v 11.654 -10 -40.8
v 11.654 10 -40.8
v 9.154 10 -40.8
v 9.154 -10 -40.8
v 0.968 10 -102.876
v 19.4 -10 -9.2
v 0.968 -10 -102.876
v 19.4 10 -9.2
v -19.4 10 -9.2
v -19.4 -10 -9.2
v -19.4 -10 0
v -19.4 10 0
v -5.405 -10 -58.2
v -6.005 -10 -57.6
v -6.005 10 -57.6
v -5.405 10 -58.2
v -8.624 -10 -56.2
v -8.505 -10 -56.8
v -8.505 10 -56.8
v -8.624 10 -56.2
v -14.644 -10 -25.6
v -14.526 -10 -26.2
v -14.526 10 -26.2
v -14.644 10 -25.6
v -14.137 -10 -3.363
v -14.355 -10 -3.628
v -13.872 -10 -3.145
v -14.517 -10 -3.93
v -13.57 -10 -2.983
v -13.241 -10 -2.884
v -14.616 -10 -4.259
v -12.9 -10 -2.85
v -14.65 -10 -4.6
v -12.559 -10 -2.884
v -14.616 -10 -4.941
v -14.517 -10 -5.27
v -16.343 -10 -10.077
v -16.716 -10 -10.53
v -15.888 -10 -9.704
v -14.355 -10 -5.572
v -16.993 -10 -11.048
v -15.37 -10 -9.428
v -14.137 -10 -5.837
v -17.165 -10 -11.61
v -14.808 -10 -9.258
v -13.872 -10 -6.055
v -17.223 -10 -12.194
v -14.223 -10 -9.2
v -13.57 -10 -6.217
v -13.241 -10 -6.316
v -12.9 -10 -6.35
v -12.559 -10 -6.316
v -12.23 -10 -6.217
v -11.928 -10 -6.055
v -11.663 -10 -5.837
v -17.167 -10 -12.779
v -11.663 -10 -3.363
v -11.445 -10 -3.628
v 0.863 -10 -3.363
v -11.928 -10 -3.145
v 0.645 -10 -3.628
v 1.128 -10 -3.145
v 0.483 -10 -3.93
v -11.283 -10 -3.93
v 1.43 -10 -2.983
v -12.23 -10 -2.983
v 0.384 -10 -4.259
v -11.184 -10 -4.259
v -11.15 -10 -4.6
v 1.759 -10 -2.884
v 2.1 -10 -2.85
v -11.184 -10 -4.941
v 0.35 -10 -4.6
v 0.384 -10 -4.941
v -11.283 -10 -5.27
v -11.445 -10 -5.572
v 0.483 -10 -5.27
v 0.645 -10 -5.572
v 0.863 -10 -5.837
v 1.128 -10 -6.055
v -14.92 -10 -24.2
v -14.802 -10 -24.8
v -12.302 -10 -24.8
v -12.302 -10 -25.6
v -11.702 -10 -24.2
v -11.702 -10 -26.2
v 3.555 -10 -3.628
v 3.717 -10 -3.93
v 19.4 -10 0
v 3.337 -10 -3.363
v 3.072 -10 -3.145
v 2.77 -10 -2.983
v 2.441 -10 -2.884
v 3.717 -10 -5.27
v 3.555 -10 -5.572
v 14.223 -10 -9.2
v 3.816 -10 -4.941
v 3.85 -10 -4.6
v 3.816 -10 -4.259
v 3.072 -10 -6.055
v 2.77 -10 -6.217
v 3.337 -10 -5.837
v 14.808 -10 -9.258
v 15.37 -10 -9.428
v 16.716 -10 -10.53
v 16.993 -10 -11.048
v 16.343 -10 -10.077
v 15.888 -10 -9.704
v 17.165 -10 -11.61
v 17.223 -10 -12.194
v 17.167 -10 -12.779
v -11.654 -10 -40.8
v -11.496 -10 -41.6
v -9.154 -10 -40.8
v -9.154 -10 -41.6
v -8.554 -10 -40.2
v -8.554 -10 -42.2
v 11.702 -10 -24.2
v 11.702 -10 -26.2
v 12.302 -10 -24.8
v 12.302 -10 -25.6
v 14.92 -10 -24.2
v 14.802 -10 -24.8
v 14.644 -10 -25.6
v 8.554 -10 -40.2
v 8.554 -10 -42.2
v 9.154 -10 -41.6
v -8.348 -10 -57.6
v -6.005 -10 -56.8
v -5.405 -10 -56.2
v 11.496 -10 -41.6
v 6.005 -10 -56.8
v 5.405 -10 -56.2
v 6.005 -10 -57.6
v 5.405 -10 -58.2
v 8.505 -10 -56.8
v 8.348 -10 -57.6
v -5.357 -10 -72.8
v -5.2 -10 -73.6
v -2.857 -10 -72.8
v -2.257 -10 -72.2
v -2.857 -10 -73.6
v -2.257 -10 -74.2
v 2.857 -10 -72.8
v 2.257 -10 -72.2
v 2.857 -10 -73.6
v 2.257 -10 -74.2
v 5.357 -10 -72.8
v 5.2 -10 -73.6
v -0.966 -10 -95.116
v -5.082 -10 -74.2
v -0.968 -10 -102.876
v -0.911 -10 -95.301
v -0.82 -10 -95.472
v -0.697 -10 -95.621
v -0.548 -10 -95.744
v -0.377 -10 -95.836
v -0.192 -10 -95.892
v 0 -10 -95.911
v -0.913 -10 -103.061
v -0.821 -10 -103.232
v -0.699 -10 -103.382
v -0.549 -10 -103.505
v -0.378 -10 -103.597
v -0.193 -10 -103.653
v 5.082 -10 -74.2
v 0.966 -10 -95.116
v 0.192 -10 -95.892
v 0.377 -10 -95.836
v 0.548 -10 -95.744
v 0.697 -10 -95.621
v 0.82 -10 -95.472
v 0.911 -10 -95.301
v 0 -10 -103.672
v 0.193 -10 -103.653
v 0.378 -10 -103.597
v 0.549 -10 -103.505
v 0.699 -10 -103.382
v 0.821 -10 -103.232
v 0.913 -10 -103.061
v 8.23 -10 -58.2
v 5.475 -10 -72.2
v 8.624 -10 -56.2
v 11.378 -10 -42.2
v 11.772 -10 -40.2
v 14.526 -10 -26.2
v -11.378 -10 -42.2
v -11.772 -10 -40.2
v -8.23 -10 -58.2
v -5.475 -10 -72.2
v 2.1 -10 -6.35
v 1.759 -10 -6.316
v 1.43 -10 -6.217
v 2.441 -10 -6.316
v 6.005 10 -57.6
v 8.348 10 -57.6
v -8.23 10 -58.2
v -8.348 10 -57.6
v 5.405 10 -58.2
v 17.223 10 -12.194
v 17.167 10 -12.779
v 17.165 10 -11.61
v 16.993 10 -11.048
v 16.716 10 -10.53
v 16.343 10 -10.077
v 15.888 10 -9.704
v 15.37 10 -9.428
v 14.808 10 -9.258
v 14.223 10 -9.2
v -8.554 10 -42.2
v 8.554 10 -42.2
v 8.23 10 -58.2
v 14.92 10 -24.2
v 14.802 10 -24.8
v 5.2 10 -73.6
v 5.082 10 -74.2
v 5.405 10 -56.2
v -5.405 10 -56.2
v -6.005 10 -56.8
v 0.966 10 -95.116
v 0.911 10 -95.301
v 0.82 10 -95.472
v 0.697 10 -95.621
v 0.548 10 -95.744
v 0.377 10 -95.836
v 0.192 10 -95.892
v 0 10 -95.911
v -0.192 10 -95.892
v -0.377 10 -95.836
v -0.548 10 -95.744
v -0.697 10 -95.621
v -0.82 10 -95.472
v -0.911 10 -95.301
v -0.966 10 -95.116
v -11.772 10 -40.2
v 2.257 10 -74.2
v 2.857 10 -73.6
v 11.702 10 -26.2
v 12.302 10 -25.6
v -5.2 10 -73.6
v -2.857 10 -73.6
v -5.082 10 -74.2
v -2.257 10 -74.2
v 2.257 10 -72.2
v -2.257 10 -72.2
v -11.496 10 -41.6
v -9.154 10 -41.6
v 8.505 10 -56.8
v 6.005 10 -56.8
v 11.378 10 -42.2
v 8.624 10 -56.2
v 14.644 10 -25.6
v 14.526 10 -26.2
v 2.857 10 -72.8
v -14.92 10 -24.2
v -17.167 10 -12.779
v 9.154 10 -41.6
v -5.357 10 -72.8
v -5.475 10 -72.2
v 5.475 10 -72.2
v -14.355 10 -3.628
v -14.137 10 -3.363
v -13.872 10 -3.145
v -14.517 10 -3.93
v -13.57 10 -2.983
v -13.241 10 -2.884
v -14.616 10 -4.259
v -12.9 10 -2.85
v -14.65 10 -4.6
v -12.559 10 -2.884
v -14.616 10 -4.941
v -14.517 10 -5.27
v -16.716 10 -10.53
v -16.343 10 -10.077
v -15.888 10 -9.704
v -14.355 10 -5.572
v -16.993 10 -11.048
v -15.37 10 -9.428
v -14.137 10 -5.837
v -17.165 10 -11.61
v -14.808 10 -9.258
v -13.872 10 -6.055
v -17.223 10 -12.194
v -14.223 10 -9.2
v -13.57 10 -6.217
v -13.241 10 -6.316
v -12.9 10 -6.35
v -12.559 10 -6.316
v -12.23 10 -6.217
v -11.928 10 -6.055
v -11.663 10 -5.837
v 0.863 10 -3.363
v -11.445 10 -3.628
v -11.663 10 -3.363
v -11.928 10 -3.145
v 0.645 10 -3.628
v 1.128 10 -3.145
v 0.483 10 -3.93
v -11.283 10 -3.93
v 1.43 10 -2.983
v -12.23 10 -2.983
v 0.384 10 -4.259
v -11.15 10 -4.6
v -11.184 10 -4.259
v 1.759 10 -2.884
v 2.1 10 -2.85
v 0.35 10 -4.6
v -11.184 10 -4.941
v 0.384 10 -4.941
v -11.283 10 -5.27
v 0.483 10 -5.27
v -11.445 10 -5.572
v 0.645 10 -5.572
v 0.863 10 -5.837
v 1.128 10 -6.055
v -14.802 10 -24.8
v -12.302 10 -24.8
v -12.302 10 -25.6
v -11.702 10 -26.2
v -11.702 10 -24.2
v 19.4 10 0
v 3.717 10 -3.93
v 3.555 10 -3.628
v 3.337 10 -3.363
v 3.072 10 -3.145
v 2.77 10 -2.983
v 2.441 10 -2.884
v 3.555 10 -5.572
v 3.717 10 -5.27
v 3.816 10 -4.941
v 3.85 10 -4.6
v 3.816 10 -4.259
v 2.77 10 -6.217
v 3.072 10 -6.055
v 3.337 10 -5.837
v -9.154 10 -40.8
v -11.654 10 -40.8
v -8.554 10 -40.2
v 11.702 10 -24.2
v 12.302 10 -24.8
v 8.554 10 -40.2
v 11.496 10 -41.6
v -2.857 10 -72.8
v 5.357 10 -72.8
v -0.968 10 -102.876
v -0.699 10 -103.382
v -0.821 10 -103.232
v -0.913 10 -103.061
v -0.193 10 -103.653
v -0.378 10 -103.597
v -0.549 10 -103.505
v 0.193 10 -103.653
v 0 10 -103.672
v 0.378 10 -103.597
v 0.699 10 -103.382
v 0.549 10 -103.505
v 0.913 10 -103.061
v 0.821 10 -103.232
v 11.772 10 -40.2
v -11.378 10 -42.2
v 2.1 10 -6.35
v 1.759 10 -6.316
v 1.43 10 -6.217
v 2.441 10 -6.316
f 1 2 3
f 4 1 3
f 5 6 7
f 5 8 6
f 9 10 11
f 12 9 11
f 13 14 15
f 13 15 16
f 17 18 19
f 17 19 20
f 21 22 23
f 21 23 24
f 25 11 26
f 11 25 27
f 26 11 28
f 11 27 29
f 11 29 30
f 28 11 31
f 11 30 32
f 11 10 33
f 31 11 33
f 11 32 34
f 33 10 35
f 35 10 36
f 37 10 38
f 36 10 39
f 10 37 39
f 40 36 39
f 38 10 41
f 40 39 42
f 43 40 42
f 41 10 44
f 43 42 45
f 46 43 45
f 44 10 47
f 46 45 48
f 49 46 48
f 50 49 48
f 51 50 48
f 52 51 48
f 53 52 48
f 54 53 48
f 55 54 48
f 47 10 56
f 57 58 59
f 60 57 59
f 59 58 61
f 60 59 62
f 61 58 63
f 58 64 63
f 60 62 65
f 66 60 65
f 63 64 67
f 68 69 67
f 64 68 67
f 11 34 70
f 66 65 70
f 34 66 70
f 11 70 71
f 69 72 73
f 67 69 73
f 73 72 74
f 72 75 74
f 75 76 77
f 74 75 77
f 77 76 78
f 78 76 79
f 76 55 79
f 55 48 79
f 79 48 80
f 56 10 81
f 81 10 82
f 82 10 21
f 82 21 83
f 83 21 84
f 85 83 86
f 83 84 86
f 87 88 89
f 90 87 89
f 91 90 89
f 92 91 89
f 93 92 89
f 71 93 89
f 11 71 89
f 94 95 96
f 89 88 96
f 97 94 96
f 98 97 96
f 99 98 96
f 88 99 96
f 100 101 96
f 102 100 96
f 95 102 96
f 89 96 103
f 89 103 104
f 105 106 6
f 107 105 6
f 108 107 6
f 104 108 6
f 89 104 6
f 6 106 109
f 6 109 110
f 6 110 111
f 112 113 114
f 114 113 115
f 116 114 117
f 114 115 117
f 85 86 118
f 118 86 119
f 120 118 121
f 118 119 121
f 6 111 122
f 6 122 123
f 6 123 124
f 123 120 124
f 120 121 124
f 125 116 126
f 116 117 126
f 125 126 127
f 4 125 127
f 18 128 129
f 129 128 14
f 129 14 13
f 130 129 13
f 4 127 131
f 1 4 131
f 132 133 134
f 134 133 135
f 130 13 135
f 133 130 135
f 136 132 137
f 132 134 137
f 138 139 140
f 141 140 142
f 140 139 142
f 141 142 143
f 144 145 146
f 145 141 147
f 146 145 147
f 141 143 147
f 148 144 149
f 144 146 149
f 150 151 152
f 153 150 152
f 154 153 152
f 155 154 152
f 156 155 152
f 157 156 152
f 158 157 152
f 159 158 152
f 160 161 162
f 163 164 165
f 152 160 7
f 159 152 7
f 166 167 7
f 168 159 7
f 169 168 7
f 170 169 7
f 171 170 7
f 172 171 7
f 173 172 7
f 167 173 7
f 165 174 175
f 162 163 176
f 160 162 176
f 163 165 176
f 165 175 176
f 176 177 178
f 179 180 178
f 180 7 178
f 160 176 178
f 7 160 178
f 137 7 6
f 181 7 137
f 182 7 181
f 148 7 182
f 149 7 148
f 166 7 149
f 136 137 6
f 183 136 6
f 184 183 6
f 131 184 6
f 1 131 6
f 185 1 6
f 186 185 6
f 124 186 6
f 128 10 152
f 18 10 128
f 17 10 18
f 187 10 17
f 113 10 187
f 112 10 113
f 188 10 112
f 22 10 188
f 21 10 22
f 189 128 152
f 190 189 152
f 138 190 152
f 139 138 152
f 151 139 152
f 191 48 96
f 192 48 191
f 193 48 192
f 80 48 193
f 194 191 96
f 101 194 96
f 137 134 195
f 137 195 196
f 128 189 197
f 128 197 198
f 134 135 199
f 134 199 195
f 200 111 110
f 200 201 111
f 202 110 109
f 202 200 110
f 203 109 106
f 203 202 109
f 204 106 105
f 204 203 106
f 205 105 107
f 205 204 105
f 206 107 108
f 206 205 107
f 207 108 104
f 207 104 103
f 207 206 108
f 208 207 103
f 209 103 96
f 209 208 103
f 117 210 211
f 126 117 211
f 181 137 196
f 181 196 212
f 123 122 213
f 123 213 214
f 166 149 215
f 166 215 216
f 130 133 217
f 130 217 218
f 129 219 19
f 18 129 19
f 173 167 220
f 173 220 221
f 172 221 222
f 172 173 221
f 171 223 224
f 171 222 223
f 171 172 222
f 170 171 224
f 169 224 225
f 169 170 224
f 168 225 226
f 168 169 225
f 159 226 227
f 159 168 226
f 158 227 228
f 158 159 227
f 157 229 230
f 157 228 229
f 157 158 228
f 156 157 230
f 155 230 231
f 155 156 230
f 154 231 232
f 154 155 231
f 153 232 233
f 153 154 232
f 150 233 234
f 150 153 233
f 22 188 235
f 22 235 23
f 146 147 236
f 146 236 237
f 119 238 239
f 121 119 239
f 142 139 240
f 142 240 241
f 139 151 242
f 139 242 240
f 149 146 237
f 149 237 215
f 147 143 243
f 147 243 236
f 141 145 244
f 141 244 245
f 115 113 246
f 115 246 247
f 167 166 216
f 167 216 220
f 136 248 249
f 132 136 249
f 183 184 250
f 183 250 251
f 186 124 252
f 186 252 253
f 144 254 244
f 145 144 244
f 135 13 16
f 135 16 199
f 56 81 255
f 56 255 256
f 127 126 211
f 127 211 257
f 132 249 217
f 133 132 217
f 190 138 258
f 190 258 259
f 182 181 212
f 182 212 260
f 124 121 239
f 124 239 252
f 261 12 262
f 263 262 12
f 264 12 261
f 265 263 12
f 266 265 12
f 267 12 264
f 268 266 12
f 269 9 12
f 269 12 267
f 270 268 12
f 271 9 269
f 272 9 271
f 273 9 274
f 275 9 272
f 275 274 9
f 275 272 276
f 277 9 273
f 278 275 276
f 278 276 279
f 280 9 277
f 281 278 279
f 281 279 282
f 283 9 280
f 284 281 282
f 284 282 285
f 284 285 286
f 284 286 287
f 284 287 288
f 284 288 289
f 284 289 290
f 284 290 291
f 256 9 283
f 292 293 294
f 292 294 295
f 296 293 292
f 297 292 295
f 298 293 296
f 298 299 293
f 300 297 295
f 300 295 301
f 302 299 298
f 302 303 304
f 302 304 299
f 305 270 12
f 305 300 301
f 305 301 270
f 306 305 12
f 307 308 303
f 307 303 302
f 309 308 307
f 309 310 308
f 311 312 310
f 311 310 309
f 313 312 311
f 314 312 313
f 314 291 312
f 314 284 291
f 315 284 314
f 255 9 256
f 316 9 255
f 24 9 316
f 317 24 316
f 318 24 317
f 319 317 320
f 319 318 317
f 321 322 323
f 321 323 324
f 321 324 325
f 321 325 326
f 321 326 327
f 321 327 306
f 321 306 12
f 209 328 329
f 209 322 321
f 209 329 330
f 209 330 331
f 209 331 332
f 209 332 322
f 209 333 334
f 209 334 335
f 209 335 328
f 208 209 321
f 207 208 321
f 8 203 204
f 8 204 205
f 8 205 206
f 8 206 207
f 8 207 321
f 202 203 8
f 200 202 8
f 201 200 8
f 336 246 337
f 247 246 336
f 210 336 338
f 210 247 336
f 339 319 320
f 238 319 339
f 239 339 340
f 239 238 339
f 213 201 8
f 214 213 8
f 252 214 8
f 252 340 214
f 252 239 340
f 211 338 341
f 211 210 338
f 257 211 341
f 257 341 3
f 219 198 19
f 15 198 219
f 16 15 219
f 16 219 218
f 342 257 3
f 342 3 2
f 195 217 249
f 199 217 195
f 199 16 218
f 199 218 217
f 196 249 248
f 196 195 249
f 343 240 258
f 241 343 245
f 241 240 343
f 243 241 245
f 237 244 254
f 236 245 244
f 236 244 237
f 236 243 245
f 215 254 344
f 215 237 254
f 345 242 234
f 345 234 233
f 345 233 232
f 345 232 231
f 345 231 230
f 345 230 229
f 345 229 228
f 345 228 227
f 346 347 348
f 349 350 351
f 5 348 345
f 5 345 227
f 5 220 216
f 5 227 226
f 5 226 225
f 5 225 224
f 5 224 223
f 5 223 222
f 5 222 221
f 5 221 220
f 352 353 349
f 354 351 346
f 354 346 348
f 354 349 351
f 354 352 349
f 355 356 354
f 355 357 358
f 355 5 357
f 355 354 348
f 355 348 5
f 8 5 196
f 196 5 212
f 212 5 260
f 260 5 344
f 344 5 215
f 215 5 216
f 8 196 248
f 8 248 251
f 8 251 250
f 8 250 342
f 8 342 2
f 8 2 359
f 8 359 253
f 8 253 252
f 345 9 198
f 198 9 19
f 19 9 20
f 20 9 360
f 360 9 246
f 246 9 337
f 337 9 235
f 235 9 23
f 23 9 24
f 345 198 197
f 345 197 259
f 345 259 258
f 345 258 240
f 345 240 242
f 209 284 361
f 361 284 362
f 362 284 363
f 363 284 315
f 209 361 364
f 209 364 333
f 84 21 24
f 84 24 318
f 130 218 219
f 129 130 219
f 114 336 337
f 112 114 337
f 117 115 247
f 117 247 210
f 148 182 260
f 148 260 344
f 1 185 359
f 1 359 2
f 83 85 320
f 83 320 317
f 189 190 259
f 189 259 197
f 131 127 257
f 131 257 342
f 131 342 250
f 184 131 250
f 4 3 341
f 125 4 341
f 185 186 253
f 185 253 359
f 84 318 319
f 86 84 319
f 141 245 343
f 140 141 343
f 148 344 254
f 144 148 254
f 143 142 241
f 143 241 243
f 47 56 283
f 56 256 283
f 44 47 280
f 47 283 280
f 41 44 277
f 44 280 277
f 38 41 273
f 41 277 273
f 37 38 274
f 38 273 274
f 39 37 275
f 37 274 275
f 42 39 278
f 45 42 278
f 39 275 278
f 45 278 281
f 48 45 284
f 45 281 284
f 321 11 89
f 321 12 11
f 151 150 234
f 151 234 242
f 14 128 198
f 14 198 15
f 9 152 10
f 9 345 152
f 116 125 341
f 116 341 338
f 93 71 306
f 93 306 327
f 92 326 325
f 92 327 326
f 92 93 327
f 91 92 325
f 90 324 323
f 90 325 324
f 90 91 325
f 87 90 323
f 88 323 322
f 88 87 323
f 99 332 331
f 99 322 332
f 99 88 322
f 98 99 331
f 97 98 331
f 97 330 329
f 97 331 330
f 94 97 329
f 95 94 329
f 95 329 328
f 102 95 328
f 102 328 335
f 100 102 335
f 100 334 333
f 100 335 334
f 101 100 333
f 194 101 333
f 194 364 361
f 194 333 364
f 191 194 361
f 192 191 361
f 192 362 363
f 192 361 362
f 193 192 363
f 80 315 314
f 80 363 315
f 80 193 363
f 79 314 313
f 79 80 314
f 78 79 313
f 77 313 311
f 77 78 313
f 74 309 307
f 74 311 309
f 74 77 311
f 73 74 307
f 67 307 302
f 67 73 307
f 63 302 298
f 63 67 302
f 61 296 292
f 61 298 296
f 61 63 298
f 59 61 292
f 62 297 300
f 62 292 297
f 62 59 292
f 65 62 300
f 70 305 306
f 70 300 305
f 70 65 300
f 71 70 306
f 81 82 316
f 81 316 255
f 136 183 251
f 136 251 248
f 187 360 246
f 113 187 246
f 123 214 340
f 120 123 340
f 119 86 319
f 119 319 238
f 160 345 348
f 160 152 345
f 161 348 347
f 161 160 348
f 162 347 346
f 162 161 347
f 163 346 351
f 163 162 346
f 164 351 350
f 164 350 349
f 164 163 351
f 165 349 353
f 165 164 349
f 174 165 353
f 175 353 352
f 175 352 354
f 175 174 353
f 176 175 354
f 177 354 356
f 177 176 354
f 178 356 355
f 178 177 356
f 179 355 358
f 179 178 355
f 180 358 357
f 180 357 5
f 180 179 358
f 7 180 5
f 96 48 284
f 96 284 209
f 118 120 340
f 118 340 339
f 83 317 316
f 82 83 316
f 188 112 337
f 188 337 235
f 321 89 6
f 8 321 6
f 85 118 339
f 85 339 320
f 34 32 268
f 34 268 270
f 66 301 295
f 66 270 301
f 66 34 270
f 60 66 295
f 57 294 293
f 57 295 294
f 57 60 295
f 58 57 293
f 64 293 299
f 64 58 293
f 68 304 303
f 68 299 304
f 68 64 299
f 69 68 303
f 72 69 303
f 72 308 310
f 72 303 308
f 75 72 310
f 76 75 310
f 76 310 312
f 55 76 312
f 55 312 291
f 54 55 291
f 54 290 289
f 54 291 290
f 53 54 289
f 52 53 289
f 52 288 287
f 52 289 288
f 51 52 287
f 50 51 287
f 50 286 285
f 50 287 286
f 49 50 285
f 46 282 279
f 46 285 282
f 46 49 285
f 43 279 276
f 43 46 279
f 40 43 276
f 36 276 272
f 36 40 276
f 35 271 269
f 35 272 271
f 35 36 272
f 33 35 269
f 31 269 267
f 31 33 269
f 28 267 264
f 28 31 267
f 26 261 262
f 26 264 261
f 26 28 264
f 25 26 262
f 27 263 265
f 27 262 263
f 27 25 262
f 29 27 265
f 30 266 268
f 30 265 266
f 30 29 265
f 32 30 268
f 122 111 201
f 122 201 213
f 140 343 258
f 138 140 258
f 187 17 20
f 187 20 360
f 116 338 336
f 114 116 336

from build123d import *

# Parameters (mm, degrees)
BOSS_EXTRUDE1_DEPTH     = 10
FILLET1_R               = 0.987
CUT_EXTRUDE1_DEPTH      = 106.944642895
CUT_EXTRUDE1_DEPTH_BACK = 106.944642895
CUT_EXTRUDE2_DEPTH      = 108.351140461
CUT_EXTRUDE2_DEPTH_BACK = 108.351140461
SKETCH3_R               = 1.75
CUT_EXTRUDE3_DEPTH      = 106.944642895
CUT_EXTRUDE3_DEPTH_BACK = 106.944642895
FILLET2_R               = 3


with BuildPart() as part:
    # Sketch1 → Boss-Extrude1 (new, symmetric)
    with BuildSketch(Plane(origin=(0, 0, 0), x_dir=(1, 0, 0), z_dir=(0, 1, 0))):
        Polygon((-19.4, 0), (19.4, 0), (19.4, 9.2), (0, 107.797571926), (-19.4, 9.2), align=None)
    extrude(amount=BOSS_EXTRUDE1_DEPTH, both=True)

    # Fillet1
    fillet1_edges = [part.edges().sort_by_distance(p)[0] for p in [
        (0, 0, -107.797571926),
    ]]
    fillet(fillet1_edges, radius=FILLET1_R)

    # Sketch2 → Cut-Extrude1 (cut, two sides: drawn at the far end of the back side and taken through both)
    with BuildSketch(Plane(origin=(0, 0, 0), x_dir=(1, 0, 0), z_dir=(0, 1, 0)).offset(-CUT_EXTRUDE1_DEPTH_BACK)):
        Polygon((-14.919848876, 24.2), (-17.871240013, 9.2), (17.871240013, 9.2), (14.919848876, 24.2), align=None)
        Polygon((-11.771698328, 40.2), (-14.526330057, 26.2), (14.526330057, 26.2), (11.771698328, 40.2), align=None)
        Polygon((-8.623547781, 56.2), (-11.37817951, 42.2), (11.37817951, 42.2), (8.623547781, 56.2), align=None)
        Polygon((-5.475397234, 72.2), (-8.230028963, 58.2), (8.230028963, 58.2), (5.475397234, 72.2), align=None)
        with BuildLine():
            Line((-0.966469566, 95.115944337), (-5.081878416, 74.2))
            Line((-5.081878416, 74.2), (5.081878416, 74.2))
            Line((5.081878416, 74.2), (0.966469566, 95.115944337))
            ThreePointArc((0.966469566, 95.115944337), (0, 95.910782356), (-0.966469566, 95.115944337))
        make_face()
    extrude(amount=CUT_EXTRUDE1_DEPTH + CUT_EXTRUDE1_DEPTH_BACK, mode=Mode.SUBTRACT)

    # Sketch3 → Cut-Extrude2 (cut, two sides: drawn at the far end of the back side and taken through both)
    with BuildSketch(Plane(origin=(0, 10, 0), x_dir=(1, 0, 0), z_dir=(0, 1, 0)).offset(-CUT_EXTRUDE2_DEPTH_BACK)):
        with Locations(Location((-12.9, 4.6, 0), (0, 0, 270))):
            Circle(SKETCH3_R)
        with Locations(Location((2.1, 4.6, 0), (0, 0, 270))):
            Circle(SKETCH3_R)
    extrude(amount=CUT_EXTRUDE2_DEPTH + CUT_EXTRUDE2_DEPTH_BACK, mode=Mode.SUBTRACT)

    # Sketch4 → Cut-Extrude3 (cut, two sides: drawn at the far end of the back side and taken through both)
    with BuildSketch(Plane(origin=(0, 0, 0), x_dir=(1, 0, 0), z_dir=(0, 1, 0)).offset(-CUT_EXTRUDE3_DEPTH_BACK)):
        Polygon((14.919848876, 24.2), (14.80179323, 24.8), (12.30179323, 24.8), (11.70179323, 24.2), align=None)
        Polygon((14.644385703, 25.6), (14.526330057, 26.2), (11.70179323, 26.2), (12.30179323, 25.6), align=None)
        Polygon((-12.30179323, 25.6), (-11.70179323, 26.2), (-14.526330057, 26.2), (-14.644385703, 25.6), align=None)
        Polygon((-12.30179323, 24.8), (-14.80179323, 24.8), (-14.919848876, 24.2), (-11.70179323, 24.2), align=None)
        Polygon((-11.37817951, 42.2), (-11.496235156, 41.6), (-9.153642683, 41.6), (-8.553642683, 42.2), align=None)
        Polygon((-11.771698328, 40.2), (-8.553642683, 40.2), (-9.153642683, 40.8), (-11.653642683, 40.8), align=None)
        Polygon((8.553642683, 40.2), (11.771698328, 40.2), (11.653642683, 40.8), (9.153642683, 40.8), align=None)
        Polygon((9.153642683, 41.6), (11.496235156, 41.6), (11.37817951, 42.2), (8.553642683, 42.2), align=None)
        Polygon((5.405492136, 56.2), (8.623547781, 56.2), (8.505492136, 56.8), (6.005492136, 56.8), align=None)
        Polygon((6.005492136, 57.6), (8.348084609, 57.6), (8.230028963, 58.2), (5.405492136, 58.2), align=None)
        Polygon((-8.230028963, 58.2), (-8.348084609, 57.6), (-6.005492136, 57.6), (-5.405492136, 58.2), align=None)
        Polygon((-8.623547781, 56.2), (-5.405492136, 56.2), (-6.005492136, 56.8), (-8.505492136, 56.8), align=None)
        Polygon((2.257341589, 72.2), (5.475397234, 72.2), (5.357341589, 72.8), (2.857341589, 72.8), align=None)
        Polygon((2.857341589, 73.6), (5.199934061, 73.6), (5.081878416, 74.2), (2.257341589, 74.2), align=None)
        Polygon((-5.081878416, 74.2), (-5.199934061, 73.6), (-2.857341589, 73.6), (-2.257341589, 74.2), align=None)
        Polygon((-5.475397234, 72.2), (-2.257341589, 72.2), (-2.857341589, 72.8), (-5.357341589, 72.8), align=None)
    extrude(amount=CUT_EXTRUDE3_DEPTH + CUT_EXTRUDE3_DEPTH_BACK, mode=Mode.SUBTRACT)

    # Fillet2
    fillet2_edges = [part.edges().sort_by_distance(p)[0] for p in [
        (17.871240013, 0, -9.2),
        (-17.871240013, 0, -9.2),
    ]]
    fillet(fillet2_edges, radius=FILLET2_R)


solid = part.part
